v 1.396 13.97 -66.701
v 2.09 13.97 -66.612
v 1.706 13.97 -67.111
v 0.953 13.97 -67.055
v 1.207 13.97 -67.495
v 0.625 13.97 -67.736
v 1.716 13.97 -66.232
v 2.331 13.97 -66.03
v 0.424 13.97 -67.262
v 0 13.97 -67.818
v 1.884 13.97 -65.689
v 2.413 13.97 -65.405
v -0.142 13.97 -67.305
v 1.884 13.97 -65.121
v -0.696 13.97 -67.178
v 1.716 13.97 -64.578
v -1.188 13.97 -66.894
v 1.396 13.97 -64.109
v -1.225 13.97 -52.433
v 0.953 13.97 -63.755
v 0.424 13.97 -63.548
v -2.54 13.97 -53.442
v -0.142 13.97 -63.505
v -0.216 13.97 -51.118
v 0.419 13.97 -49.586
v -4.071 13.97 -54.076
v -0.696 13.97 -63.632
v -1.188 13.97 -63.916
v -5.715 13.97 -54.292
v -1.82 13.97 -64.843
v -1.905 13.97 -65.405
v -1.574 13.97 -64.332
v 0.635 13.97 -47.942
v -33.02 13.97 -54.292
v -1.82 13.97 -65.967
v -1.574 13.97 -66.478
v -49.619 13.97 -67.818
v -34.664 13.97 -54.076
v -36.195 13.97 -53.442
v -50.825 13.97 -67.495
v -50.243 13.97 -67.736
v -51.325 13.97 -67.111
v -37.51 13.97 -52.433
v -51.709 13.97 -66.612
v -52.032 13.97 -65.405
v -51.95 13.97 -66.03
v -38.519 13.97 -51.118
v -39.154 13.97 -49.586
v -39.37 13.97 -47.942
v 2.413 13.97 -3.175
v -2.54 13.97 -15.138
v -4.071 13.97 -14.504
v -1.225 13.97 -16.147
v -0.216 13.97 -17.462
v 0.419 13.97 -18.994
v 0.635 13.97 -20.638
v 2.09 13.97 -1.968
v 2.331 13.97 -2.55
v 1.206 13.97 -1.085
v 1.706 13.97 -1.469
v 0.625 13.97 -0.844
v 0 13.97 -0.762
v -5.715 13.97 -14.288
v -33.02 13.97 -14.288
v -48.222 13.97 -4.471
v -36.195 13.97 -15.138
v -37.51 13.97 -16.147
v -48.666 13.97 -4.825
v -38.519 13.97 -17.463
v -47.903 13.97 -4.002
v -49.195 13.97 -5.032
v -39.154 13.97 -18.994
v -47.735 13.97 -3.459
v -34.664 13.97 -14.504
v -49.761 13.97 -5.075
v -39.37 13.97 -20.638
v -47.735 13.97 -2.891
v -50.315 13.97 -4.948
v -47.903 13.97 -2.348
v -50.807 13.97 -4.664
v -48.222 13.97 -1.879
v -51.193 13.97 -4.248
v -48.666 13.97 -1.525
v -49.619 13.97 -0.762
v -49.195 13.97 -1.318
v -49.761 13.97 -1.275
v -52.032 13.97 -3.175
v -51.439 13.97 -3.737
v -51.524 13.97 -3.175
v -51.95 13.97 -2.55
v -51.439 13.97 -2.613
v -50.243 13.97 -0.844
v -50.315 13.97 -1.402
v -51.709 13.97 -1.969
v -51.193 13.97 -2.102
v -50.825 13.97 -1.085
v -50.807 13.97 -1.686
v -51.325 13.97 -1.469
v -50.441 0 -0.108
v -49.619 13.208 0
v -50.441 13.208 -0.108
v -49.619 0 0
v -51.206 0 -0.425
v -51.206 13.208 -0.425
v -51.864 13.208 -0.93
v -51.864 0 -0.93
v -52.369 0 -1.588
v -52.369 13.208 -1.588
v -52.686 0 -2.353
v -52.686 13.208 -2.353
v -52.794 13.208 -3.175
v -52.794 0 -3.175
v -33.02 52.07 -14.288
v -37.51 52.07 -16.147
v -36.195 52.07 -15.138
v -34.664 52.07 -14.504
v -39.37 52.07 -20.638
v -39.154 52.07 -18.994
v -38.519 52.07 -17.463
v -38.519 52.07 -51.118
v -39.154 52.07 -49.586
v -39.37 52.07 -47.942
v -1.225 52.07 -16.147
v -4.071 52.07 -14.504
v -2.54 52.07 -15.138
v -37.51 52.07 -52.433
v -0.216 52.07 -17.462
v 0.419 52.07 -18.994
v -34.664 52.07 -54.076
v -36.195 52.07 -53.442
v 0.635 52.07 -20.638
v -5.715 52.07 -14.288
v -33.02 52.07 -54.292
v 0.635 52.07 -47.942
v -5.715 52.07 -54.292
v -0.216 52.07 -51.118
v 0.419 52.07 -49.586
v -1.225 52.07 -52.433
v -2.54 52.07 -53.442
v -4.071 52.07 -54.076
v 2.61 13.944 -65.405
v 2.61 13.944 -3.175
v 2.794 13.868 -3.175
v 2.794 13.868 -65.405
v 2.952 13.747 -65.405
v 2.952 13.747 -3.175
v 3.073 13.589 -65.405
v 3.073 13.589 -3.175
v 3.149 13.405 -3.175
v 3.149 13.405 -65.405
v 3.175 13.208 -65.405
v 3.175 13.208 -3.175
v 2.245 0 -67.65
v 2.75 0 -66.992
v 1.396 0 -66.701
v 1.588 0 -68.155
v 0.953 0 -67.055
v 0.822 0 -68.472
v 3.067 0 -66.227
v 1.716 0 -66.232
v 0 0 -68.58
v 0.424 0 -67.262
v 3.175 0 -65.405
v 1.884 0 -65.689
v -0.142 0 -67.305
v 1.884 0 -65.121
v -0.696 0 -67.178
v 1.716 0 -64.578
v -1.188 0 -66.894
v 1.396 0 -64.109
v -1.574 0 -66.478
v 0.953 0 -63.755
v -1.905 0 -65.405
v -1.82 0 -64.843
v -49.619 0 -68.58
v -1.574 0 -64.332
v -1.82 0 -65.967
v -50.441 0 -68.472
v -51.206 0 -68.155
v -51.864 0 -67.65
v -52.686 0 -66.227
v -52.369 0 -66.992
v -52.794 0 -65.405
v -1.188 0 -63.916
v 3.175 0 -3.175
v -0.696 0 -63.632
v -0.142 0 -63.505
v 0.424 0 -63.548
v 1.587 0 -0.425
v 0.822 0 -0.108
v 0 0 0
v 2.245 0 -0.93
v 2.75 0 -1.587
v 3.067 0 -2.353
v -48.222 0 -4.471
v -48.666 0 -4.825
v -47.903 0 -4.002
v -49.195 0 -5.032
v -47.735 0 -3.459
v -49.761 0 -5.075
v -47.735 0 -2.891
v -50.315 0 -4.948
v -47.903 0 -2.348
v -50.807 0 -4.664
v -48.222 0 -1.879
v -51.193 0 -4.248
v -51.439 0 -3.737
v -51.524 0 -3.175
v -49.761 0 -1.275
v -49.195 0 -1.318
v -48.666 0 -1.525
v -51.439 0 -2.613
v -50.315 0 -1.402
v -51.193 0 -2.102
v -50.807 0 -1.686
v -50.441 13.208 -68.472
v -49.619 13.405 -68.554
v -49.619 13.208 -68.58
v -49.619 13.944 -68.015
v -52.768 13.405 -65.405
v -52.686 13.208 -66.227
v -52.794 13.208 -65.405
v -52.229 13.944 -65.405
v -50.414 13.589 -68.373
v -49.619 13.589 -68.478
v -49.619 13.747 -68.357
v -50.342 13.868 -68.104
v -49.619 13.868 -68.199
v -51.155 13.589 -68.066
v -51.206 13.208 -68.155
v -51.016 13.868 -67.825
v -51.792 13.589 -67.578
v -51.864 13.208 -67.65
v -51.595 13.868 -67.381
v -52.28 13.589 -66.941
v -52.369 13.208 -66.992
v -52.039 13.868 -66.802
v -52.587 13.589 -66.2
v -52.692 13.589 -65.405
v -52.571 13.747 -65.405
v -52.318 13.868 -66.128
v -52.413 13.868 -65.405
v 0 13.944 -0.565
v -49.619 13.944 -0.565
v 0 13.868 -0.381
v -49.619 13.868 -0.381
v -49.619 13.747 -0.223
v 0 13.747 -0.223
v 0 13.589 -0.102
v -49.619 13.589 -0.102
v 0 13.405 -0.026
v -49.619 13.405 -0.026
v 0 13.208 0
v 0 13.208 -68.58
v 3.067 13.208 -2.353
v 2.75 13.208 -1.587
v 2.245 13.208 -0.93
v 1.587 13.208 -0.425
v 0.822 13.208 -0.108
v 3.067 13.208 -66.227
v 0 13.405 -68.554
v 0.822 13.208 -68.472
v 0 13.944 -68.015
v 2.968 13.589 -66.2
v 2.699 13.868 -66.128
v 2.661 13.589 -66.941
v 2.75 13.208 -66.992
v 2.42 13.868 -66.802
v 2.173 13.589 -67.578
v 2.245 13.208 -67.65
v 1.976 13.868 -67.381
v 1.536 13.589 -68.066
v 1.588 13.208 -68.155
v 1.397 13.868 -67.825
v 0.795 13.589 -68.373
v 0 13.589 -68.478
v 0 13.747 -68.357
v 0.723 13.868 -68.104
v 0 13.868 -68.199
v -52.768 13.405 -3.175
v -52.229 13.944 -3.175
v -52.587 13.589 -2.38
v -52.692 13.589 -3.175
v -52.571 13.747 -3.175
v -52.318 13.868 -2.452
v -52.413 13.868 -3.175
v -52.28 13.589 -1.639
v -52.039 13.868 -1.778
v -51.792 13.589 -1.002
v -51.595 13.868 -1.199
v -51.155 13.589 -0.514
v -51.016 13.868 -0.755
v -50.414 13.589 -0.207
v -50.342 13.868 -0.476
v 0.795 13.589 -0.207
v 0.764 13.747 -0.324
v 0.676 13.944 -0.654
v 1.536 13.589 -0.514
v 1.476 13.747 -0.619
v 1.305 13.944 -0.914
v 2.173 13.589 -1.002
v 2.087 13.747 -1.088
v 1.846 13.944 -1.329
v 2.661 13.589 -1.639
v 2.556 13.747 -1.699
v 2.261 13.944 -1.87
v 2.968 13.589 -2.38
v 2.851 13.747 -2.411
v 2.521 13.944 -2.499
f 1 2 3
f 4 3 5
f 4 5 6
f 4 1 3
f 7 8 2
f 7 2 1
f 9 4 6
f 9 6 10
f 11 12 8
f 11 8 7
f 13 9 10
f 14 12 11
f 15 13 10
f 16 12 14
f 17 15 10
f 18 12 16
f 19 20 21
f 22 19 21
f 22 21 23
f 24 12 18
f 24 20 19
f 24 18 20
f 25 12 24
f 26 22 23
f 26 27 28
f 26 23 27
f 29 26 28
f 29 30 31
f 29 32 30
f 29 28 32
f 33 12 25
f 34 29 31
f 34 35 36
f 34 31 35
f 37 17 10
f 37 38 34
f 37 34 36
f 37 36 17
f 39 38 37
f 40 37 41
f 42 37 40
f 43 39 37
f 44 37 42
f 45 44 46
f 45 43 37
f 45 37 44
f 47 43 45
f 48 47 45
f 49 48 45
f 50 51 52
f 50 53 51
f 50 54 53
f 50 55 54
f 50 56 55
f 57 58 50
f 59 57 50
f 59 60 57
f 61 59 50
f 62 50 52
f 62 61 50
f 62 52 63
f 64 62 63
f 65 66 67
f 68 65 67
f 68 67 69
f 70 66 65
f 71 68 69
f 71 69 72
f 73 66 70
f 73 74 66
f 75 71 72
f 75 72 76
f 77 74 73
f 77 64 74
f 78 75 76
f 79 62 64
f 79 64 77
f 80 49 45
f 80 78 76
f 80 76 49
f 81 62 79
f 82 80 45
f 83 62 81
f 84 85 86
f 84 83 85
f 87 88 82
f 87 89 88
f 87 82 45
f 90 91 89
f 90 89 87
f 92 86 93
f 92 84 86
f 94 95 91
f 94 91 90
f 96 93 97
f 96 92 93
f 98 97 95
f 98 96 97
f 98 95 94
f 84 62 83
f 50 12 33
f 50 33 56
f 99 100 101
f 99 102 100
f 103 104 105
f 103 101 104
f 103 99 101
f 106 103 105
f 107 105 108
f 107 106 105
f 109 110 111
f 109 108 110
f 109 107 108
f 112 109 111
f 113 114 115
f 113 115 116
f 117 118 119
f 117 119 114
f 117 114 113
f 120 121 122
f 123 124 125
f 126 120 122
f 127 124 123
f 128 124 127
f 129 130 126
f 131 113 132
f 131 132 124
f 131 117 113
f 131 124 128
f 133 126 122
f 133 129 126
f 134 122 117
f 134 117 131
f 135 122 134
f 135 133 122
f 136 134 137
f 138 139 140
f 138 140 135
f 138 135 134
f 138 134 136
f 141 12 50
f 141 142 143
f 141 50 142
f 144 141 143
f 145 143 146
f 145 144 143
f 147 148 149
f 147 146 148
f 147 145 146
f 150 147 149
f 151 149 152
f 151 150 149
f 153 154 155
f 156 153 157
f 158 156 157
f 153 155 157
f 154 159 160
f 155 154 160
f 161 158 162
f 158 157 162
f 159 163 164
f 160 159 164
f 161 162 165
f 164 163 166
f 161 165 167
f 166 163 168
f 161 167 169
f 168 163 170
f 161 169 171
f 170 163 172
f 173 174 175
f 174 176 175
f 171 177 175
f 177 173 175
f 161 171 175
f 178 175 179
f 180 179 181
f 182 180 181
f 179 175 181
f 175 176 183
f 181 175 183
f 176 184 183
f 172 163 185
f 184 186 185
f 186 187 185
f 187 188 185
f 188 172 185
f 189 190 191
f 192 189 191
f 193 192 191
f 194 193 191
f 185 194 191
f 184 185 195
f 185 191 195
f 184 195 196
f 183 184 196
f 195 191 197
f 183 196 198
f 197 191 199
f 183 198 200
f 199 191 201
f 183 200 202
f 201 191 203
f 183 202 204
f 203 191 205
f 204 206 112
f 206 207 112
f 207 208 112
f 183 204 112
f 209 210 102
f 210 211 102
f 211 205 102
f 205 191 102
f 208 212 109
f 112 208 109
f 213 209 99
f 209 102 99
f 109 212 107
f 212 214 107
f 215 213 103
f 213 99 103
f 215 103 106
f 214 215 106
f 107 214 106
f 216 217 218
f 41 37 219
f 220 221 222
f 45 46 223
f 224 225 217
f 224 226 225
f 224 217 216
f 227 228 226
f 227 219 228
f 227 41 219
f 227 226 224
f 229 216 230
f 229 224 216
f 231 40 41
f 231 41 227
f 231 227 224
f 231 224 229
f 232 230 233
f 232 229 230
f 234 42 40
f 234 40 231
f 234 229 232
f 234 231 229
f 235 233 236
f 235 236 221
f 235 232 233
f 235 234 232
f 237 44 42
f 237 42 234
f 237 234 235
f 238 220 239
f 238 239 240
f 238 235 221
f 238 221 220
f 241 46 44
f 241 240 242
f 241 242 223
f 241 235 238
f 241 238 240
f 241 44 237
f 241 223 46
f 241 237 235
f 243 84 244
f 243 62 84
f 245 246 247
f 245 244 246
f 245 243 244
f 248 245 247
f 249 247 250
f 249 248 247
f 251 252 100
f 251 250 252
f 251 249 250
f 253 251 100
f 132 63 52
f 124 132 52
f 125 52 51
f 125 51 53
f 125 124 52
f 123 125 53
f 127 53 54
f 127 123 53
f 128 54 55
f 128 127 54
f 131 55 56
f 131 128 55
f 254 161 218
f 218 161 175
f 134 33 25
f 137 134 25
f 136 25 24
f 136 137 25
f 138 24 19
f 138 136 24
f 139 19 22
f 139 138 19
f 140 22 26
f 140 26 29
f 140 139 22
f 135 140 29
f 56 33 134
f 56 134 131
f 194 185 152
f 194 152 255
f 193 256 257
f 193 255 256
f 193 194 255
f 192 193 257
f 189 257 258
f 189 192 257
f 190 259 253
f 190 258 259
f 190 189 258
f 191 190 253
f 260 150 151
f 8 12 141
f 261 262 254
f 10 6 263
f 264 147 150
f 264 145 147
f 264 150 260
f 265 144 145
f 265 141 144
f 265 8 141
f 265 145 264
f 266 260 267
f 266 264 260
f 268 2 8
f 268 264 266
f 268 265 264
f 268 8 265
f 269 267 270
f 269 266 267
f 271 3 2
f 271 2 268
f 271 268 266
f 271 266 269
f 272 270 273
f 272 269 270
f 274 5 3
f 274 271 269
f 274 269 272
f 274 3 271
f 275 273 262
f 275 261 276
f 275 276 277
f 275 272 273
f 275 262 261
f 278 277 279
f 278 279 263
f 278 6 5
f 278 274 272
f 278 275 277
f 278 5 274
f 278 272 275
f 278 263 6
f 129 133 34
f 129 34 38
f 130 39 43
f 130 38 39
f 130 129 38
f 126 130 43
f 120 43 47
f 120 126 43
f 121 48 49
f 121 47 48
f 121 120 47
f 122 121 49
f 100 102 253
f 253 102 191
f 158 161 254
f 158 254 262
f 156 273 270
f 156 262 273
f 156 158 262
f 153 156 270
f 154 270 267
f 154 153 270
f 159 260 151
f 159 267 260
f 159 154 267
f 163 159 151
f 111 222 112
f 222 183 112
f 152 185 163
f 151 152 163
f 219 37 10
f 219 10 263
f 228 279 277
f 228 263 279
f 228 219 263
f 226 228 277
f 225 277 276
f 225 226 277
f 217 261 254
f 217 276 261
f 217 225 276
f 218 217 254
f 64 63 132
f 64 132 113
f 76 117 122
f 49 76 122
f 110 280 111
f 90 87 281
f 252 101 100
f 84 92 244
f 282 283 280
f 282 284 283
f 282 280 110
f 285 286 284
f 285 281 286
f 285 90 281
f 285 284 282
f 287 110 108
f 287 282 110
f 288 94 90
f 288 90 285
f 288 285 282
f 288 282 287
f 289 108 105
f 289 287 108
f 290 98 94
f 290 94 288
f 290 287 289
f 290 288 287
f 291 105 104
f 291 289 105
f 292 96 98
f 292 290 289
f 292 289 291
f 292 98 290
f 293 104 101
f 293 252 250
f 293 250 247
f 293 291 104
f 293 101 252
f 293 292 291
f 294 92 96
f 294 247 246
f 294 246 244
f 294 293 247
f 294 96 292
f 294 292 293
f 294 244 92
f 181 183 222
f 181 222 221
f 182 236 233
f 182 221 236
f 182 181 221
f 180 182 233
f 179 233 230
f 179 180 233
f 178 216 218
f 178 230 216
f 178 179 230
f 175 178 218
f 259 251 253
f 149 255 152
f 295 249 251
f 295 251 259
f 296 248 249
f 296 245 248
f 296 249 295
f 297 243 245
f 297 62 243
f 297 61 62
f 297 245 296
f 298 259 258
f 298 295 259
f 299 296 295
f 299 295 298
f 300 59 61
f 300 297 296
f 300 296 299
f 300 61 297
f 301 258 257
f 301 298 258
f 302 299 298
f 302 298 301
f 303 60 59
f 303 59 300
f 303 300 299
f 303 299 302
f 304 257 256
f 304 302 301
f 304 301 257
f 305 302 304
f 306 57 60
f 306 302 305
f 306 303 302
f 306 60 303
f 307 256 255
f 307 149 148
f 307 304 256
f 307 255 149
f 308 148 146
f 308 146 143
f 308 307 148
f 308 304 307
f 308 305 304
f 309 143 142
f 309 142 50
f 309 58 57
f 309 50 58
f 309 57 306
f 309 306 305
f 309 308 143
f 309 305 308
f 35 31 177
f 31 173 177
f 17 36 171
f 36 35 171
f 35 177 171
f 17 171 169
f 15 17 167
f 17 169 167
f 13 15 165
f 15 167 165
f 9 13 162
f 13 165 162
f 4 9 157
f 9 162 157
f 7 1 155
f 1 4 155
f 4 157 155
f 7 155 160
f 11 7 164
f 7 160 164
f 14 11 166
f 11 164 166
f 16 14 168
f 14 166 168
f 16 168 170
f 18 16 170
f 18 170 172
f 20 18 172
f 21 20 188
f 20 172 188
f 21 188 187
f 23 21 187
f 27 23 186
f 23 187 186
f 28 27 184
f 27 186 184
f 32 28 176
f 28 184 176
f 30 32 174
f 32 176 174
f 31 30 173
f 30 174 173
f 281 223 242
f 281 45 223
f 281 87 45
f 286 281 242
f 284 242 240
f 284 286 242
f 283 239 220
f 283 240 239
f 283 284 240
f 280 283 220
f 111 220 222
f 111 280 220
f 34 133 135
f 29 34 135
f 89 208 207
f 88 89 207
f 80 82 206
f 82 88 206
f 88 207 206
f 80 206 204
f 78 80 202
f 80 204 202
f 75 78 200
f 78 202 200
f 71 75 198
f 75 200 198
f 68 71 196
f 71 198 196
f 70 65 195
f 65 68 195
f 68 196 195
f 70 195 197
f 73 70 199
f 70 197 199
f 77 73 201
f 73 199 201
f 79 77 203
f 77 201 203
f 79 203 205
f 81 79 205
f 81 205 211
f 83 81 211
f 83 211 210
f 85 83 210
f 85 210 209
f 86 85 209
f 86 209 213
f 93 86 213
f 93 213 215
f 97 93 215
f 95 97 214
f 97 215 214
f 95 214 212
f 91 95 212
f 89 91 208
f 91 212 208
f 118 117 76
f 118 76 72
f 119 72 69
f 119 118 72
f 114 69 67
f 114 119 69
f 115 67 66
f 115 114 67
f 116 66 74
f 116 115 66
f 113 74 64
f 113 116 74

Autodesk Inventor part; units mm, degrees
ref_plane "YZ Plane" through (0, 0, 0) normal (1, 0, 0) x (0, 1, 0)
ref_plane "XZ Plane" through (0, 0, 0) normal (0, 1, 0) x (-1, 0, 0)
ref_plane "XY Plane" through (0, 0, 0) normal (0, 0, 1) x (1, 0, 0)
sketch "Sketch2" plane through (0, 0, 0) normal (0, 1, 0) x (-1, 0, 0)
  circle A0 centre (49.6189, -7.9375) radius 2.6988 construction
  circle A1 centre (0, -3.175) radius 2.6988 construction
  circle A2 centre (49.6189, -3.175) radius 1.905
  circle A3 centre (0, -65.405) radius 1.905
  arc A4 (49.6189, -68.58) -> (52.7939, -65.405) centre (49.6189, -65.405) ccw
  line L0 (52.7939, -65.405) -> (52.7939, -3.175)
  arc A5 (52.7939, -3.175) -> (49.6189, 0) centre (49.6189, -3.175) ccw
  line L1 (49.6189, 0) -> (0, 0)
  arc A6 (0, 0) -> (-3.175, -3.175) centre (0, -3.175) ccw
  line L2 (-3.175, -3.175) -> (-3.175, -65.405)
  arc A7 (-3.175, -65.405) -> (0, -68.58) centre (0, -65.405) ccw
  line L3 (0, -68.58) -> (49.6189, -68.58)
  circle A8 centre (49.6189, -65.405) radius 2.6988 construction
  circle A9 centre (0, -60.6425) radius 2.6988 construction
  point P0 (24.8095, -34.29)
extrude "Extrusion1" add sketch "Sketch2" along normal blind 13.97
fillet "Fillet1" radius 0.762 8 edges at (-52.7939, 13.97, -34.29) (-51.864, 13.97, -0.9299) (-24.8095, 13.97, 0) (2.2451, 13.97, -0.9299) (3.175, 13.97, -34.29) (2.2451, 13.97, -67.6501) (-24.8095, 13.97, -68.58) (-51.864, 13.97, -67.6501)
sketch "Sketch3" plane through (0, 13.97, 0) normal (0, 1, 0) x (1, 0, 0)
  line L0 (-52.0319, 3.175) -> (-52.0319, 65.405) projected
  line L1 (-39.37, 54.2925) -> (0.635, 54.2925)
  line L2 (0.635, 54.2925) -> (0.635, 14.2875)
  line L3 (0.635, 14.2875) -> (-39.37, 14.2875)
  line L4 (-39.37, 14.2875) -> (-39.37, 54.2925)
  line L5 (3.175, 3.175) -> (3.175, 65.405) projected
  point P0 (0, 0)
  point P1 (-52.0319, 34.29)
  point P2 (-39.37, 34.29)
  dimension "d3" = 40.005
  dimension "d4" = 40.005
  dimension "d5" = 2.54
extrude "Extrusion2" add sketch "Sketch3" along normal blind 38.1
fillet "Fillet2" radius 6.35 4 edges at (-39.37, 33.02, -14.2875) (0.635, 33.02, -14.2875) (0.635, 33.02, -54.2925) (-39.37, 33.02, -54.2925)
properties part number "Victor Controller" material "Nylon 6/6"
